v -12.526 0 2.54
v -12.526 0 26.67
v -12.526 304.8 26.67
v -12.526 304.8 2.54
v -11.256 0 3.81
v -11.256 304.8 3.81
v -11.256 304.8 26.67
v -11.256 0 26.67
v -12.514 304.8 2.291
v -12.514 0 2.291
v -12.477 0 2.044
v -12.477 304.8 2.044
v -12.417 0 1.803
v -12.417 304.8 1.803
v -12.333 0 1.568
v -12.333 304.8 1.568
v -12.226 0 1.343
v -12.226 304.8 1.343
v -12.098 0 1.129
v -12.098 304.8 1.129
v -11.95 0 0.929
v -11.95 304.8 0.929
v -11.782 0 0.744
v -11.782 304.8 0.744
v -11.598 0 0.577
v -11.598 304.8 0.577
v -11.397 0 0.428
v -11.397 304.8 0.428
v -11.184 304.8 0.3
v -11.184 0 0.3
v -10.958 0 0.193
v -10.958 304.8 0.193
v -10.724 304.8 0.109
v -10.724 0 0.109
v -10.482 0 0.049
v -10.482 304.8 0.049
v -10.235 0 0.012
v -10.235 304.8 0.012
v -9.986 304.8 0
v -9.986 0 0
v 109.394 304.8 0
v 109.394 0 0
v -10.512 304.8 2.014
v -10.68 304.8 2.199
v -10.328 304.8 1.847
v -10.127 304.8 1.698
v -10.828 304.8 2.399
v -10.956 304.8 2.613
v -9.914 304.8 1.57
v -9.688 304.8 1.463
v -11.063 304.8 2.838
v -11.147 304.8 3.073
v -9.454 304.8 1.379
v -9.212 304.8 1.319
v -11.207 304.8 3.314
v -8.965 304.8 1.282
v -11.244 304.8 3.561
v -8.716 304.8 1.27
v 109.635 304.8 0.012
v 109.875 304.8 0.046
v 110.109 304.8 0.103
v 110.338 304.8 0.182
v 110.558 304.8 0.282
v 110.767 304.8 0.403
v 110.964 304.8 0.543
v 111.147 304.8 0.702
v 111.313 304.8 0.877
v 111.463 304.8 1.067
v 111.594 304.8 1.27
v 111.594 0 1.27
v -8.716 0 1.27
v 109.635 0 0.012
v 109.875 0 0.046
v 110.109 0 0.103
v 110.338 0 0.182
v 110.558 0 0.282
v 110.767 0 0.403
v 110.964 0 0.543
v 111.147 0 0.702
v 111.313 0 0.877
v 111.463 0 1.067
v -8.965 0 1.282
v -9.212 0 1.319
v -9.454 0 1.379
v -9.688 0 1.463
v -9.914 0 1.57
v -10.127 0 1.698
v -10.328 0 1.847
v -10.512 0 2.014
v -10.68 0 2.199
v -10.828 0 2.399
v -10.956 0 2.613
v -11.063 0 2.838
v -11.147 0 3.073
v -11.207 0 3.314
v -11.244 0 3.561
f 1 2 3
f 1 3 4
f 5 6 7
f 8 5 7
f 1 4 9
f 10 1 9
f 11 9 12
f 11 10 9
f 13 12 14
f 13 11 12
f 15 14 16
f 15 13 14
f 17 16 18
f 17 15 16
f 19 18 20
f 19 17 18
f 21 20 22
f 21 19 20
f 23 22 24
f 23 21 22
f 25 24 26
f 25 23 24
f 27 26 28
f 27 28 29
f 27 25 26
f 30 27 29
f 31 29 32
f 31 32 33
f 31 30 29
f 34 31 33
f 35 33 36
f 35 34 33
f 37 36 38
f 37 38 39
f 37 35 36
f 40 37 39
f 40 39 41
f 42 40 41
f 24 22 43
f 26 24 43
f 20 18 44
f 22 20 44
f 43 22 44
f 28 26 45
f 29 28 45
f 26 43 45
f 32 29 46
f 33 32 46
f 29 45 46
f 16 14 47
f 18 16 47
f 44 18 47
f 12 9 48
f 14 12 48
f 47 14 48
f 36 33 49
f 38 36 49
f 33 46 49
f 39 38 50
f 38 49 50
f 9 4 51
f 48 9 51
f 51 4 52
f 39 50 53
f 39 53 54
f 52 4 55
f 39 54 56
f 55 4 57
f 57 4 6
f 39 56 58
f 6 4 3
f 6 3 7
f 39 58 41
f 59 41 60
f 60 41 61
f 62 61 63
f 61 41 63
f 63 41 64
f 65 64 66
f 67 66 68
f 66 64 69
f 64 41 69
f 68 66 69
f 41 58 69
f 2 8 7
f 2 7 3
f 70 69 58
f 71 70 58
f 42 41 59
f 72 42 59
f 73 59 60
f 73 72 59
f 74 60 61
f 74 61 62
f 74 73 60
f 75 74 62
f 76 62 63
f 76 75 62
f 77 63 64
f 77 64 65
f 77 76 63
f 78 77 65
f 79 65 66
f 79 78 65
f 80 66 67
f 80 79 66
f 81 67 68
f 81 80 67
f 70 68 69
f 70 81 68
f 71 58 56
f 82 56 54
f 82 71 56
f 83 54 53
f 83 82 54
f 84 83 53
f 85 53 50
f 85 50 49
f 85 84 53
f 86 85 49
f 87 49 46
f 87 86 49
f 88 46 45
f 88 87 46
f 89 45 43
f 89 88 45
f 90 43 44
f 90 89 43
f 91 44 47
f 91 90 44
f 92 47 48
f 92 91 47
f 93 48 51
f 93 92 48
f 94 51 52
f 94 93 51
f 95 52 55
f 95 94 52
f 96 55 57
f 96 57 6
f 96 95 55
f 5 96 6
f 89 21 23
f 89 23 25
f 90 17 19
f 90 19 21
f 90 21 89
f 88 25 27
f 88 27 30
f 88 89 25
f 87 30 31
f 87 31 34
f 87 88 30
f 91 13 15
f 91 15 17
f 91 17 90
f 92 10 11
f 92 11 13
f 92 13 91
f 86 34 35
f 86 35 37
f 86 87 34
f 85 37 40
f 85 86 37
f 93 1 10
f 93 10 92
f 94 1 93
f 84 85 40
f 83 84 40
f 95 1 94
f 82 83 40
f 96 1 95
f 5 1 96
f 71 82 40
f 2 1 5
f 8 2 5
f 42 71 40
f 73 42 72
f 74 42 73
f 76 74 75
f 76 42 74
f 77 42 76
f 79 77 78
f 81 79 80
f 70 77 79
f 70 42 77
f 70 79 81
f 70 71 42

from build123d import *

# Parameters (mm, degrees)
F1_DEPTH = 304.8


with BuildPart() as f1:
    # F0 (on Front) → F1 (new body)
    with BuildSketch(Plane.XZ):
        with BuildLine():
            Line((-9.986188, 0), (0, 0))
            Line((0, 0), (109.393812, 0))
            ThreePointArc((109.393812, 0), (110.663812, 0.340295), (111.593517, 1.27))
            Line((111.593517, 1.27), (-8.716188, 1.27))
            ThreePointArc((-8.716188, 1.27), (-10.512239, 2.013949), (-11.256188, 3.81))
            Line((-11.256188, 3.81), (-11.256188, 26.67))
            Line((-11.256188, 26.67), (-12.526188, 26.67))
            Line((-12.526188, 26.67), (-12.526188, 2.54))
            ThreePointArc((-12.526188, 2.54), (-11.782239, 0.743949), (-9.986188, 0))
        make_face()
    extrude(amount=-F1_DEPTH)


solid = f1.part
